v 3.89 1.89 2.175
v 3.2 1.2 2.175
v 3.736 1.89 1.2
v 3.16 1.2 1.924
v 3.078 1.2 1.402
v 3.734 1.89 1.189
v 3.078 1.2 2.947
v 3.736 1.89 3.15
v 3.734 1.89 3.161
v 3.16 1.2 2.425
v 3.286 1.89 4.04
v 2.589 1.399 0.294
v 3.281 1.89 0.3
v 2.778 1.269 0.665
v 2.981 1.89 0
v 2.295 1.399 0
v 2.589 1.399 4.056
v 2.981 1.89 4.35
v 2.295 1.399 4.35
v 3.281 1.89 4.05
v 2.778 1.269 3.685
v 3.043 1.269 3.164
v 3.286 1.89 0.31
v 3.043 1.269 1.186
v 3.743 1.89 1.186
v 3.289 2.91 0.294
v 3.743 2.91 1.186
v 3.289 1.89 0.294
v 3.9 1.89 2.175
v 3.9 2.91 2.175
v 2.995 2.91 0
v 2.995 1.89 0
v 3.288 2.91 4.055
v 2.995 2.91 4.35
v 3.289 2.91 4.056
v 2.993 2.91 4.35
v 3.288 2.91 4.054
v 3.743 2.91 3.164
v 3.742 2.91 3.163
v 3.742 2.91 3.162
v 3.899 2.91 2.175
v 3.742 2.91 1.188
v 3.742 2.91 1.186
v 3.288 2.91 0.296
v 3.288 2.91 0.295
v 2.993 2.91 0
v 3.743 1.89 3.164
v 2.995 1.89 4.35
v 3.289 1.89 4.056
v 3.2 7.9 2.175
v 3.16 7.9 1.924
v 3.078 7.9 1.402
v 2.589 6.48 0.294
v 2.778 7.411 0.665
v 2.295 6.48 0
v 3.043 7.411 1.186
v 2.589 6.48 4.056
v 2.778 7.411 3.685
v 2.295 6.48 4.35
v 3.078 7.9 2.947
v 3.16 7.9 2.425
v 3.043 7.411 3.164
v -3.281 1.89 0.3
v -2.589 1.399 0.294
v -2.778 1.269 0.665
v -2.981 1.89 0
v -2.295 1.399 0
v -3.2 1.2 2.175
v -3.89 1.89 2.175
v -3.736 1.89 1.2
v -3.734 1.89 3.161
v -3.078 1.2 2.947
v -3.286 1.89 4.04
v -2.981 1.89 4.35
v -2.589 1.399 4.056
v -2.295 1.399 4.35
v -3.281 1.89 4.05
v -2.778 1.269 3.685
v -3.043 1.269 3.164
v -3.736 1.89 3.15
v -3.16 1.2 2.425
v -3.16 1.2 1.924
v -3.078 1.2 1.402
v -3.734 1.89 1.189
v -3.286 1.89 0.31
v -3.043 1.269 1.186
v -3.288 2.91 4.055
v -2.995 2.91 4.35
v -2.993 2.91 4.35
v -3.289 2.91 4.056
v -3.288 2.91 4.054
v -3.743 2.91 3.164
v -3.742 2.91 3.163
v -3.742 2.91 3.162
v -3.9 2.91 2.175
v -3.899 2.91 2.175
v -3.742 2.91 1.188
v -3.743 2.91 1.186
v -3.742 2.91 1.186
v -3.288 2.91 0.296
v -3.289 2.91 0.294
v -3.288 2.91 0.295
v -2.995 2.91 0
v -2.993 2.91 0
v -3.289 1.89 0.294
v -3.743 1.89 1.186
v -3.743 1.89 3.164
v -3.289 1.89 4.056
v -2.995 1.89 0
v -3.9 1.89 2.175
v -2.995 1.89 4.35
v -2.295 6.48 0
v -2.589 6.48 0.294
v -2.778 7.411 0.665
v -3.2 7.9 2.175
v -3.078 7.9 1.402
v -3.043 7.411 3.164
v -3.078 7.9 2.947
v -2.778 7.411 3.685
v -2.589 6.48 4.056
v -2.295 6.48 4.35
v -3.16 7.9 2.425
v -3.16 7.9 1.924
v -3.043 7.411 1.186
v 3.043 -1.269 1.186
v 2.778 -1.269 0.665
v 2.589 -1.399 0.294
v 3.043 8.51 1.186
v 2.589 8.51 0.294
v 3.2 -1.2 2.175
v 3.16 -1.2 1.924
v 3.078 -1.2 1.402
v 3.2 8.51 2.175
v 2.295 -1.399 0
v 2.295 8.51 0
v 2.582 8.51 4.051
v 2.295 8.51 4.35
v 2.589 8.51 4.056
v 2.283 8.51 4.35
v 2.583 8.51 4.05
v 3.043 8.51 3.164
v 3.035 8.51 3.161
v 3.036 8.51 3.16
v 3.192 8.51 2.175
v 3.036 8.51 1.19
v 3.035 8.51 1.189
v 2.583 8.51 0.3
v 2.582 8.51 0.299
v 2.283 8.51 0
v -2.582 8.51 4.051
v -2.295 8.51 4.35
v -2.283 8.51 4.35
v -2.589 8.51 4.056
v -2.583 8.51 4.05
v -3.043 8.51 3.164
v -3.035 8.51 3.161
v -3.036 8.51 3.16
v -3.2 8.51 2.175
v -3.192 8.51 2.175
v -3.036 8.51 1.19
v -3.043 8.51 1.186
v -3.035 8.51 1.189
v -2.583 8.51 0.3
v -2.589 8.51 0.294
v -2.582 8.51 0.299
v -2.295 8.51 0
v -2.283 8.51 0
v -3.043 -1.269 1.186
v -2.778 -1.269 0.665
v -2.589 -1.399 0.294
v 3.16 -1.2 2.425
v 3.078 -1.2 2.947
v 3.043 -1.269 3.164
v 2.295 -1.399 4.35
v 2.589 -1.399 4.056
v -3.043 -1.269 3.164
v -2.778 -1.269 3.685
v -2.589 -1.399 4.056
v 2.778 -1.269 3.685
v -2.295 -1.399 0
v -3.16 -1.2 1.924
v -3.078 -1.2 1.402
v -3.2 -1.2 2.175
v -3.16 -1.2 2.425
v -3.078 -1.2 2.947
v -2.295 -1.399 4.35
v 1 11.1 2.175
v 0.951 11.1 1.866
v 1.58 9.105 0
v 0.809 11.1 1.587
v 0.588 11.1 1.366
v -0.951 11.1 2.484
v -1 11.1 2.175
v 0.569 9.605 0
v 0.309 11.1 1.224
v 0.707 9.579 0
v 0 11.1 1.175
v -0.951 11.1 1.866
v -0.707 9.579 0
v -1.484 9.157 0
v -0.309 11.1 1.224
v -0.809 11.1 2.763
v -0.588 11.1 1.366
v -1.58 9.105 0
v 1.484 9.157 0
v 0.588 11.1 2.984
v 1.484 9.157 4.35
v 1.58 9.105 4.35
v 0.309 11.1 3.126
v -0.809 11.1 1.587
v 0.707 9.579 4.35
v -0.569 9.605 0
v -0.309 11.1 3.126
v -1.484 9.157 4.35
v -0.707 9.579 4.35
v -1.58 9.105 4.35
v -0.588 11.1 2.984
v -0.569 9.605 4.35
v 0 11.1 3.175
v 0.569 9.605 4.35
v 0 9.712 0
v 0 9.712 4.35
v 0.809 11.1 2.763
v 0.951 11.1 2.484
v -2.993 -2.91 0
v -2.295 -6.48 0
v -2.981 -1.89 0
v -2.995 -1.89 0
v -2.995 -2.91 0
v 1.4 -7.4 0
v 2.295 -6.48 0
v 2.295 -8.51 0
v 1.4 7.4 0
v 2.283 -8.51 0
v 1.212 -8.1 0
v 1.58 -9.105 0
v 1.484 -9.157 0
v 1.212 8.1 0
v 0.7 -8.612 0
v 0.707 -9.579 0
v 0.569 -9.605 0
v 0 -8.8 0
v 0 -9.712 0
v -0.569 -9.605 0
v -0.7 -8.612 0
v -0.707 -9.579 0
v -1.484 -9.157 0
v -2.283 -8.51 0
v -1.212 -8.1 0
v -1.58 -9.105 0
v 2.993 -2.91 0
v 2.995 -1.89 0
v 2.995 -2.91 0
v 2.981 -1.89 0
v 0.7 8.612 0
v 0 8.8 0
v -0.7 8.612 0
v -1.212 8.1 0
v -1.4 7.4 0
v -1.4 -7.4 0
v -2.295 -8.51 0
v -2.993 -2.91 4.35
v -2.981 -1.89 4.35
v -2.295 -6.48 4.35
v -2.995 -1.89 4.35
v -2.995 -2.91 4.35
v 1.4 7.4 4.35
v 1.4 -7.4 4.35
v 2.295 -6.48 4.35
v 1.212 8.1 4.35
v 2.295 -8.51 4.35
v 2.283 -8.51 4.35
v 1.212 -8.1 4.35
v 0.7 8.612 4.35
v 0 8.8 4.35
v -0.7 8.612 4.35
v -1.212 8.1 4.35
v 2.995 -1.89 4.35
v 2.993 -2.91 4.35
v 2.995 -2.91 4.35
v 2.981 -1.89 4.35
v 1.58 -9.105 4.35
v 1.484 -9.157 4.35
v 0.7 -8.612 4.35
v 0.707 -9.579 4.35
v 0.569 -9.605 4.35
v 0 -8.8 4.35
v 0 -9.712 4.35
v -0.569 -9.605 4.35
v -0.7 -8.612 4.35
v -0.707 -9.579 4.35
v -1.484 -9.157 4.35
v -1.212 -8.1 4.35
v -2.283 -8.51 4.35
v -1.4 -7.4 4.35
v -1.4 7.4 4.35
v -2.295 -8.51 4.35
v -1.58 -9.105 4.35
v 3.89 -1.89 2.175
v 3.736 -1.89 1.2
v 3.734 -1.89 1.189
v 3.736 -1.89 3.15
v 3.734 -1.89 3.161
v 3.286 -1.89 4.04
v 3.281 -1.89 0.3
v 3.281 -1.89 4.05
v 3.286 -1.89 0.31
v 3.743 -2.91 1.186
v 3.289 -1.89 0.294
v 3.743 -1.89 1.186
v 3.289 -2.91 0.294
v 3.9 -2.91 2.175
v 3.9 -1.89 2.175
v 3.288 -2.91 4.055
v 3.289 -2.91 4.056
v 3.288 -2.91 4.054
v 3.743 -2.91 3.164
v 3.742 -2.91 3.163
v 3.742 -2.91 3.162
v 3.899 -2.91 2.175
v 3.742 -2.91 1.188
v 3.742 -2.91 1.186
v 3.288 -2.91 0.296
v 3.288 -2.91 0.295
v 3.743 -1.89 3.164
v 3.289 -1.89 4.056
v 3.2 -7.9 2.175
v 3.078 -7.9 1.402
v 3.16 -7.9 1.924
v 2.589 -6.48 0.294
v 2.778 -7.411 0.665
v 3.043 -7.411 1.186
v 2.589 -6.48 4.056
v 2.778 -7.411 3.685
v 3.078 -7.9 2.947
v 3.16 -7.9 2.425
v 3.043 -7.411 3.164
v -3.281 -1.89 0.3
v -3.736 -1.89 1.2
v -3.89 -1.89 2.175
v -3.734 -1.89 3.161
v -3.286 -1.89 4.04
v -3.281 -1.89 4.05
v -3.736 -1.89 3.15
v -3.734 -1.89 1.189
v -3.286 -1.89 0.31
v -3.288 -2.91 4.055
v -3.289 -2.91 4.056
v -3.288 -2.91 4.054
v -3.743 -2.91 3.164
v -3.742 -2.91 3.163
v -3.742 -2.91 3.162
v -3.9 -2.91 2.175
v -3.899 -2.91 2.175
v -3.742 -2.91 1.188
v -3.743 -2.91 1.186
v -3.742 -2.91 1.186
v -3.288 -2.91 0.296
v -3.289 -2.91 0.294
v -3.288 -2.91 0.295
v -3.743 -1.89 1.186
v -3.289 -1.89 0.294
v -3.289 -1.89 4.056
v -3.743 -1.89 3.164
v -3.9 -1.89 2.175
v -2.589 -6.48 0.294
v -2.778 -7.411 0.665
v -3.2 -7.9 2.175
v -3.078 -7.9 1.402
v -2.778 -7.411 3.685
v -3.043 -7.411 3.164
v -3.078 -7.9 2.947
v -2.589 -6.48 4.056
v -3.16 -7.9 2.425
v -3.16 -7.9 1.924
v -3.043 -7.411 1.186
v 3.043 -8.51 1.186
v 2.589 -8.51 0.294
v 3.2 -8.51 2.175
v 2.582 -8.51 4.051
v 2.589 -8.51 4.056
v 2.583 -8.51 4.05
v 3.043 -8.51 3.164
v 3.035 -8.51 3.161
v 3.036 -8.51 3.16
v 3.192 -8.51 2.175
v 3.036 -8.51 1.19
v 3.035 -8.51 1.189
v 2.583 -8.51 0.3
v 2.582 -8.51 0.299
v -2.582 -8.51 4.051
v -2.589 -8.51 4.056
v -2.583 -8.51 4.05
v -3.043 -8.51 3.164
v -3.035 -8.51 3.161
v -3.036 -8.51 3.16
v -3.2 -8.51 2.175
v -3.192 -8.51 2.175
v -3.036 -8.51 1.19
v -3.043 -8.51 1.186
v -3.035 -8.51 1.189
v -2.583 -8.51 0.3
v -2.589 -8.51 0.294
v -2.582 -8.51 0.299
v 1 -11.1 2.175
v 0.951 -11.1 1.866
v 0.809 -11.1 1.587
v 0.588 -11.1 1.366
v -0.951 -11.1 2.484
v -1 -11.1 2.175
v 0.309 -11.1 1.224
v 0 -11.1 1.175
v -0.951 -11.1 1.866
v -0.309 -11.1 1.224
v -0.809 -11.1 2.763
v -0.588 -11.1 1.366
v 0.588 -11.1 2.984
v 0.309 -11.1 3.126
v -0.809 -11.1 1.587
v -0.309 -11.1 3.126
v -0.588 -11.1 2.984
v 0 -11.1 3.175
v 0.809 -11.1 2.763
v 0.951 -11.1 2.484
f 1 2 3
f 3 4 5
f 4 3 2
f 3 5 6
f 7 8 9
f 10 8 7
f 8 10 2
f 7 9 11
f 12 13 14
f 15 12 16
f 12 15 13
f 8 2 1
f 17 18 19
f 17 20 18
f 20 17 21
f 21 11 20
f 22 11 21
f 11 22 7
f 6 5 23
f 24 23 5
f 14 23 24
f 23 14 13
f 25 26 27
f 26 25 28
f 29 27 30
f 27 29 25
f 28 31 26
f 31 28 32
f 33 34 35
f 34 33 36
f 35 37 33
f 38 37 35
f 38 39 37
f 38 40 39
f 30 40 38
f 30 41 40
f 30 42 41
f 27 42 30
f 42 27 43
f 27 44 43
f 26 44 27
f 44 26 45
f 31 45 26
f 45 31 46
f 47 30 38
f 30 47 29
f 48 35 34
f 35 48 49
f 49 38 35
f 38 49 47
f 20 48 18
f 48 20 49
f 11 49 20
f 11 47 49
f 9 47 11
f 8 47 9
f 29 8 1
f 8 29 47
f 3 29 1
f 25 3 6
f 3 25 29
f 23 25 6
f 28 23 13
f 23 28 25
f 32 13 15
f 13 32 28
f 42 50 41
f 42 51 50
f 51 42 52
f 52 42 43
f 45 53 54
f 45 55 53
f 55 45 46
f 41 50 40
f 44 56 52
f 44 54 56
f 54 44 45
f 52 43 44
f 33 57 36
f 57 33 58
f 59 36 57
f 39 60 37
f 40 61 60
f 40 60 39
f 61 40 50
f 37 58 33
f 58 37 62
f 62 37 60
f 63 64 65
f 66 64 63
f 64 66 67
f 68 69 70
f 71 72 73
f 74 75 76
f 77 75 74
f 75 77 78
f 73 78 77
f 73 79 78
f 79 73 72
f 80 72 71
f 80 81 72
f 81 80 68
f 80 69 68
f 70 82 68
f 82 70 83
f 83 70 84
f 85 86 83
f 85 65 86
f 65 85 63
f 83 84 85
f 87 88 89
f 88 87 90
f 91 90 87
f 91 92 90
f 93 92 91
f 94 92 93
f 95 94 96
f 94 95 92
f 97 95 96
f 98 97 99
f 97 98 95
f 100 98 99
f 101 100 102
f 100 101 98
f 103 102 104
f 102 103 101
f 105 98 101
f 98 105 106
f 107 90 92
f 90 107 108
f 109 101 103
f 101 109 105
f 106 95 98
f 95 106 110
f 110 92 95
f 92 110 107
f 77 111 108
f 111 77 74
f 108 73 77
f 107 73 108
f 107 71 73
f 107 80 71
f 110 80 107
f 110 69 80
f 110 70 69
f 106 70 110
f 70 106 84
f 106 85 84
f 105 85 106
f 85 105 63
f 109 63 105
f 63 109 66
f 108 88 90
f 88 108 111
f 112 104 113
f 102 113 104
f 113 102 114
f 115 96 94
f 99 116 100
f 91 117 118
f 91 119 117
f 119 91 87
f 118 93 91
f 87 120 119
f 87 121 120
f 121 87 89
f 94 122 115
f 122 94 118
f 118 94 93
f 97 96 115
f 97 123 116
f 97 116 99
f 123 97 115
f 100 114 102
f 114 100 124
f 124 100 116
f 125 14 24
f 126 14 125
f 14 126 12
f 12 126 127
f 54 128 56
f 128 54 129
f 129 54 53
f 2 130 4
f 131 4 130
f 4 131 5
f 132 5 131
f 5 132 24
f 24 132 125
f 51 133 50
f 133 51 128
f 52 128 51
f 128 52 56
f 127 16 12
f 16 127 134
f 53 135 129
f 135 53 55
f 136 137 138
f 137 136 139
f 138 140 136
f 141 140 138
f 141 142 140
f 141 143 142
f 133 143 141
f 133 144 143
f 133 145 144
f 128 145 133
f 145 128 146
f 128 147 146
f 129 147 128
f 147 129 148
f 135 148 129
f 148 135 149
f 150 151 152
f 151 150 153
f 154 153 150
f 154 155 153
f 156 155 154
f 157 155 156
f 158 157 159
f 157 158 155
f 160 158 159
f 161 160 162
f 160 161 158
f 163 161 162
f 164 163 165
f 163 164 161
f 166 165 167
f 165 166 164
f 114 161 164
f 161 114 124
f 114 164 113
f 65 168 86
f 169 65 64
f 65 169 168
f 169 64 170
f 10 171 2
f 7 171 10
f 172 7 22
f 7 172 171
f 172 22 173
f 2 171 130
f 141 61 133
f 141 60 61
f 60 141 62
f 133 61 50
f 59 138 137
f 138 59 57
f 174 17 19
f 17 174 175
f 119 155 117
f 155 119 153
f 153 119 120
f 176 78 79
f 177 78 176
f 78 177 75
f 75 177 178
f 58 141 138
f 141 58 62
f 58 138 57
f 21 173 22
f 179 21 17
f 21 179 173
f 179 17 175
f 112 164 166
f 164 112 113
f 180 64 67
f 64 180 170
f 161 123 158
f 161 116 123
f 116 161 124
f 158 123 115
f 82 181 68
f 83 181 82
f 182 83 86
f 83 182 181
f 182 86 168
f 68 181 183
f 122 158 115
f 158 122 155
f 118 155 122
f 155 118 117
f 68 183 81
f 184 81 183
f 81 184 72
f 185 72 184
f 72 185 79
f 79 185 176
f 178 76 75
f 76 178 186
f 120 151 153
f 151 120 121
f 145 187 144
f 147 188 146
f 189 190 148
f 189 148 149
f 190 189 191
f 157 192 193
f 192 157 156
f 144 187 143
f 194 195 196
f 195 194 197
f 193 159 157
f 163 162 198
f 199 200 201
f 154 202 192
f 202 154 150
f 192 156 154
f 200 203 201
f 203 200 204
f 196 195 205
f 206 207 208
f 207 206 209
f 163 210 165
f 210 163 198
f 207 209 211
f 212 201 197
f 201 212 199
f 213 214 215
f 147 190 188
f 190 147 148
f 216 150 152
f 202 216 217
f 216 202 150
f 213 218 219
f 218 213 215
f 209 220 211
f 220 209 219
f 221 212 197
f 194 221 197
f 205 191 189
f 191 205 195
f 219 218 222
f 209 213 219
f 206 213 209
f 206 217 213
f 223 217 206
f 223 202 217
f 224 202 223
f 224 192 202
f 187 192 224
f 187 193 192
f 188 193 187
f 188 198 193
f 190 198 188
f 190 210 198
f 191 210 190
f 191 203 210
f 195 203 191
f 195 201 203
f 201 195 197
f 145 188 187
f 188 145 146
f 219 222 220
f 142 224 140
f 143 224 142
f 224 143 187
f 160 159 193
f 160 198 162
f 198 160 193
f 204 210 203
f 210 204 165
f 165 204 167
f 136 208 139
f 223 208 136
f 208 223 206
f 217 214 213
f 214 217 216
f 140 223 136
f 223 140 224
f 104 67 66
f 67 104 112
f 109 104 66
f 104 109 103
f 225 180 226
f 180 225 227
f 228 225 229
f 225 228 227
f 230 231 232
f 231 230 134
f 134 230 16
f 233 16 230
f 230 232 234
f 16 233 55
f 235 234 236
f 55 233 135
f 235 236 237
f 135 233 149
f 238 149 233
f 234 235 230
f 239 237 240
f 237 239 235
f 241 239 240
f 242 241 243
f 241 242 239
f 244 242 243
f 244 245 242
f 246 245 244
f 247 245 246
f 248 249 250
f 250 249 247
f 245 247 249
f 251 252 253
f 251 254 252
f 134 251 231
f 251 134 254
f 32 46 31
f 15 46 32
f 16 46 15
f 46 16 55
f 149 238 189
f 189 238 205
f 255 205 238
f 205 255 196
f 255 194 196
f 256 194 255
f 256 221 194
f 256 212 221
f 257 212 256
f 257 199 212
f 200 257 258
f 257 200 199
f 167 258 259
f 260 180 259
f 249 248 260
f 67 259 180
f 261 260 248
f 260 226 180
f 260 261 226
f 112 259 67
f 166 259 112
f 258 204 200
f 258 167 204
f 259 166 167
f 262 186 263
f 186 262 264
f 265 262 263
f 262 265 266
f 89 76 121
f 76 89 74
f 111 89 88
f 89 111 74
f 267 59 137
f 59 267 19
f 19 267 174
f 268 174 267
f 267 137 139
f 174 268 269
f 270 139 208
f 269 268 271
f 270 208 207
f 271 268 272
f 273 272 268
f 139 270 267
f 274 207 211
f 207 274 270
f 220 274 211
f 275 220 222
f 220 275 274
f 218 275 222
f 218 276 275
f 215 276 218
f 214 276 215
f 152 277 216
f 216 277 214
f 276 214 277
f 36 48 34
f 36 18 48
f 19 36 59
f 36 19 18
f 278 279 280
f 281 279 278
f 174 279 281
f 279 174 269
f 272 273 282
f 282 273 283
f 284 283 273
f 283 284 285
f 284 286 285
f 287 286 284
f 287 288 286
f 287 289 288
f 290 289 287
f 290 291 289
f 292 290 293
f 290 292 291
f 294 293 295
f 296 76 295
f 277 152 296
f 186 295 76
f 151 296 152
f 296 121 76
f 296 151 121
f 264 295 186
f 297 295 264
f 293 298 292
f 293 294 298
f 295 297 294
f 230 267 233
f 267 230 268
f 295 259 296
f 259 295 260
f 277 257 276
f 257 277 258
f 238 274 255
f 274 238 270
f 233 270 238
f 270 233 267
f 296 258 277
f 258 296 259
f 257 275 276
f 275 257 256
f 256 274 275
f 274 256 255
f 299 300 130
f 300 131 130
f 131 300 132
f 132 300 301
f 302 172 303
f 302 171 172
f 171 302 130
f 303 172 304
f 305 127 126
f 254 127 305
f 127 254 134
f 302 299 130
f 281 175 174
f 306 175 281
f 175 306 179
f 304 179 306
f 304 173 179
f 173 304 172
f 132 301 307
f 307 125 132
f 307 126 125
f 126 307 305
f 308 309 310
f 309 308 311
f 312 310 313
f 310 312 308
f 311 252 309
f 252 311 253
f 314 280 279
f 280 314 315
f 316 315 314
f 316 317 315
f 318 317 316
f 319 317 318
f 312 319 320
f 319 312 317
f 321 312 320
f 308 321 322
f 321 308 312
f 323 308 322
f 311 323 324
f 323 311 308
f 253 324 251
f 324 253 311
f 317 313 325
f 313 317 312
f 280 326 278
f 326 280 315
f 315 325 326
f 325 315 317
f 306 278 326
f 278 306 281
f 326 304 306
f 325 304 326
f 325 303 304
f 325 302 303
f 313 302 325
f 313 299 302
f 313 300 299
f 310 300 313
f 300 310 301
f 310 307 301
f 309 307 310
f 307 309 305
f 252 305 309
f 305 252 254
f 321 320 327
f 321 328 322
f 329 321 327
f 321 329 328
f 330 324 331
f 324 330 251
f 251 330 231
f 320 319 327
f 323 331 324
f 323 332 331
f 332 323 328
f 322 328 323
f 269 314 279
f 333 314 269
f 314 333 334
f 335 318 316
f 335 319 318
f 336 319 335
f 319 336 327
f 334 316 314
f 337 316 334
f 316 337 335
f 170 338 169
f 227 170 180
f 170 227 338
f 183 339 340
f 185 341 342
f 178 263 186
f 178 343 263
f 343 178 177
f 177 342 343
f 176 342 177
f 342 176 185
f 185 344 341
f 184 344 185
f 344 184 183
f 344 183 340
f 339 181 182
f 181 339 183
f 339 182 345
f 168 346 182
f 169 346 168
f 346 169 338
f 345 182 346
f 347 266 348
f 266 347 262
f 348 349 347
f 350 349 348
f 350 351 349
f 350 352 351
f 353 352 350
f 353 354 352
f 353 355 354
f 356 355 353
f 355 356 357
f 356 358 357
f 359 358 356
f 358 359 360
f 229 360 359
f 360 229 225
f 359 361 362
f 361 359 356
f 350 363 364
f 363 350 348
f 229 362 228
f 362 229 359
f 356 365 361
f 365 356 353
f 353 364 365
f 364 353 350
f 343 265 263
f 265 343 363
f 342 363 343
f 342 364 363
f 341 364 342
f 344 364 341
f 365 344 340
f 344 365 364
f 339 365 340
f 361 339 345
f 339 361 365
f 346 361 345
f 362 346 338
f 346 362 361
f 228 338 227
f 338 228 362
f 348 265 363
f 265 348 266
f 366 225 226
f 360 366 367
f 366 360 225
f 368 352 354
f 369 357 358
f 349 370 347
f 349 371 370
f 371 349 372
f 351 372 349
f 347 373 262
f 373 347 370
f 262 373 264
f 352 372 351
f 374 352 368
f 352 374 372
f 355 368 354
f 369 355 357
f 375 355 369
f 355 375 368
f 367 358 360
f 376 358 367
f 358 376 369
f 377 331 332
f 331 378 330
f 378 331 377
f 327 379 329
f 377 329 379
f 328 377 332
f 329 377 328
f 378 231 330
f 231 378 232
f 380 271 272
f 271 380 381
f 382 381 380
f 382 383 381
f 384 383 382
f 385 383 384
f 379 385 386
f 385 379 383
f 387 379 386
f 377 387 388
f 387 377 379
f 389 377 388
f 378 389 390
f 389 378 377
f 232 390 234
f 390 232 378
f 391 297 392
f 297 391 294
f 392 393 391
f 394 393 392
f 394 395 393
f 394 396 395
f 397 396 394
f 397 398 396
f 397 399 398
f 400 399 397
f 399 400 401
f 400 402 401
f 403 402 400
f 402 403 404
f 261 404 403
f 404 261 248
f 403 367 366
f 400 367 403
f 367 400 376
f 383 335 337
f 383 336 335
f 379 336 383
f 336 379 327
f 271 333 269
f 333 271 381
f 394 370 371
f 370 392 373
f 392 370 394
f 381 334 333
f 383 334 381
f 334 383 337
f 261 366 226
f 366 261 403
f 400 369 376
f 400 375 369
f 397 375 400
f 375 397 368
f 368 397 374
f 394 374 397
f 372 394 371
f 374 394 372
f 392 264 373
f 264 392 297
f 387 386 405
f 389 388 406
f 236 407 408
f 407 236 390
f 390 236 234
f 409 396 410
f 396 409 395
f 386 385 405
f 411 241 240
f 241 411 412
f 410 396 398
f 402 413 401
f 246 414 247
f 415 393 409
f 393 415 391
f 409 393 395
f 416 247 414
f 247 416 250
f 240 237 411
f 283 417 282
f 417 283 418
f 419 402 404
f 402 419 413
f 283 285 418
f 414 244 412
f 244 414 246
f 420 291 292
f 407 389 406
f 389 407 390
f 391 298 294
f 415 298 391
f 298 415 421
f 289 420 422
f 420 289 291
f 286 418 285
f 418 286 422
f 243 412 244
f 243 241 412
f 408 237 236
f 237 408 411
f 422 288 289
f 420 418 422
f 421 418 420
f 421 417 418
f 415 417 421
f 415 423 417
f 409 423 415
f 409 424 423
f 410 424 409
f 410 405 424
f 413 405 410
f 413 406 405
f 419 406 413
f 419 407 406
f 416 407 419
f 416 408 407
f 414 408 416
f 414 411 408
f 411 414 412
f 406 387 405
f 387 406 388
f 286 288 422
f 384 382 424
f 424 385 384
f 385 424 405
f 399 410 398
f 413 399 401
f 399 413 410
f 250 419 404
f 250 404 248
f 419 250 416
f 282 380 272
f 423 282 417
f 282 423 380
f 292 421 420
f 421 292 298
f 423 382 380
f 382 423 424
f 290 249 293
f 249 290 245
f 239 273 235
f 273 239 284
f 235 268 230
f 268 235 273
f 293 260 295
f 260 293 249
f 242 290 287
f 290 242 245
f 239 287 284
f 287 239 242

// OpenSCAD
// new pin connectors

object=0;//[0:Pinpeg,1:Pinhole]
//Pinpeg is twice this length
length=13;
//Of hole; pinpeg is smaller to fit
diameter=7;
//Only affects pinhole
hole_twist=0;//[0:free,1:fixed]
//Pulls the snaps together on the pinpeg to ensure a tight coupling
preload=0.1;
//Allows pins to fit easily into holes
clearance=0.3;
//Thicker makes the pinpeg stiffer
thickness=1.8;
//Height of snap nubs
snap=0.4;
//Put fins on pinhole to help with printing strength
fins=1;//[1:yes,0:no]

$fn=20;

if(object==0)pinpeg(r=diameter/2,l=length,d=2.5-preload,nub=snap,t=thickness,space=clearance);
if(object==1)pinhole(r=diameter/2,l=length,nub=snap,fixed=hole_twist,fins=fins);

//pin(flat=0);
//%pinhole(fixed=true);

//pinpeg();
//translate([10,0,0])difference(){
//	cylinder(r=5.5,h=14);
//	pinhole(fixed=true);
//}
//translate([-10,0,0])difference(){
//	cylinder(r=5.5,h=14);
//	pinhole(fixed=false);
//}

module pin(r=3.5,l=13,d=2.4,slot=10,nub=0.4,t=1.8,space=0.3,flat=1)
translate(flat*[0,0,r/sqrt(2)-space])rotate((1-flat)*[90,0,0])
difference(){
	rotate([-90,0,0])intersection(){
		union(){
			translate([0,0,-0.01])cylinder(r=r-space,h=l-r-0.98);
			translate([0,0,l-r-1])cylinder(r1=r-space,r2=1,h=r-space/2+1-1.75);
			translate([nub+space,0,d])nub(r-space,nub+space);
			translate([-nub-space,0,d])nub(r-space,nub+space);
		}
		cube([3*r,r*sqrt(2)-2*space,2*l+3*r],center=true);
	}
	translate([0,d,0])cube([2*(r-t-space),slot,2*r],center=true);
	translate([0,d-slot/2,0])cylinder(r=r-t-space,h=2*r,center=true,$fn=12);
	translate([0,d+slot/2,0])cylinder(r=r-t-space,h=2*r,center=true,$fn=12);
}

module nub(r,nub)
union(){
	translate([0,0,-nub-0.5])cylinder(r1=r-nub,r2=r,h=nub);
	cylinder(r=r,h=1.02,center=true);
	translate([0,0,0.5])cylinder(r1=r,r2=r-nub,h=5);
}

module pinhole(r=3.5,l=13,d=2.5,nub=0.4,fixed=false,fins=true)
intersection(){
	union(){
		translate([0,0,-0.1])cylinder(r=r,h=l-r+0.1);
		translate([0,0,l-r-0.01])cylinder(r1=r,r2=0,h=r);
		translate([0,0,d])nub(r+nub,nub);
		if(fins)translate([0,0,l-r]){
			cube([2*r,0.01,2*r],center=true);
			cube([0.01,2*r,2*r],center=true);
		}
	}
	if(fixed)cube([3*r,r*sqrt(2),2*l+3*r],center=true);
}

module pinpeg(r=3.5,l=13,d=2.4,nub=0.4,t=1.8,space=0.3)
union(){
	pin(r=r,l=l,d=d,nub=nub,t=t,space=space,flat=1);
	mirror([0,1,0])pin(r=r,l=l,d=d,nub=nub,t=t,space=space,flat=1);
}
